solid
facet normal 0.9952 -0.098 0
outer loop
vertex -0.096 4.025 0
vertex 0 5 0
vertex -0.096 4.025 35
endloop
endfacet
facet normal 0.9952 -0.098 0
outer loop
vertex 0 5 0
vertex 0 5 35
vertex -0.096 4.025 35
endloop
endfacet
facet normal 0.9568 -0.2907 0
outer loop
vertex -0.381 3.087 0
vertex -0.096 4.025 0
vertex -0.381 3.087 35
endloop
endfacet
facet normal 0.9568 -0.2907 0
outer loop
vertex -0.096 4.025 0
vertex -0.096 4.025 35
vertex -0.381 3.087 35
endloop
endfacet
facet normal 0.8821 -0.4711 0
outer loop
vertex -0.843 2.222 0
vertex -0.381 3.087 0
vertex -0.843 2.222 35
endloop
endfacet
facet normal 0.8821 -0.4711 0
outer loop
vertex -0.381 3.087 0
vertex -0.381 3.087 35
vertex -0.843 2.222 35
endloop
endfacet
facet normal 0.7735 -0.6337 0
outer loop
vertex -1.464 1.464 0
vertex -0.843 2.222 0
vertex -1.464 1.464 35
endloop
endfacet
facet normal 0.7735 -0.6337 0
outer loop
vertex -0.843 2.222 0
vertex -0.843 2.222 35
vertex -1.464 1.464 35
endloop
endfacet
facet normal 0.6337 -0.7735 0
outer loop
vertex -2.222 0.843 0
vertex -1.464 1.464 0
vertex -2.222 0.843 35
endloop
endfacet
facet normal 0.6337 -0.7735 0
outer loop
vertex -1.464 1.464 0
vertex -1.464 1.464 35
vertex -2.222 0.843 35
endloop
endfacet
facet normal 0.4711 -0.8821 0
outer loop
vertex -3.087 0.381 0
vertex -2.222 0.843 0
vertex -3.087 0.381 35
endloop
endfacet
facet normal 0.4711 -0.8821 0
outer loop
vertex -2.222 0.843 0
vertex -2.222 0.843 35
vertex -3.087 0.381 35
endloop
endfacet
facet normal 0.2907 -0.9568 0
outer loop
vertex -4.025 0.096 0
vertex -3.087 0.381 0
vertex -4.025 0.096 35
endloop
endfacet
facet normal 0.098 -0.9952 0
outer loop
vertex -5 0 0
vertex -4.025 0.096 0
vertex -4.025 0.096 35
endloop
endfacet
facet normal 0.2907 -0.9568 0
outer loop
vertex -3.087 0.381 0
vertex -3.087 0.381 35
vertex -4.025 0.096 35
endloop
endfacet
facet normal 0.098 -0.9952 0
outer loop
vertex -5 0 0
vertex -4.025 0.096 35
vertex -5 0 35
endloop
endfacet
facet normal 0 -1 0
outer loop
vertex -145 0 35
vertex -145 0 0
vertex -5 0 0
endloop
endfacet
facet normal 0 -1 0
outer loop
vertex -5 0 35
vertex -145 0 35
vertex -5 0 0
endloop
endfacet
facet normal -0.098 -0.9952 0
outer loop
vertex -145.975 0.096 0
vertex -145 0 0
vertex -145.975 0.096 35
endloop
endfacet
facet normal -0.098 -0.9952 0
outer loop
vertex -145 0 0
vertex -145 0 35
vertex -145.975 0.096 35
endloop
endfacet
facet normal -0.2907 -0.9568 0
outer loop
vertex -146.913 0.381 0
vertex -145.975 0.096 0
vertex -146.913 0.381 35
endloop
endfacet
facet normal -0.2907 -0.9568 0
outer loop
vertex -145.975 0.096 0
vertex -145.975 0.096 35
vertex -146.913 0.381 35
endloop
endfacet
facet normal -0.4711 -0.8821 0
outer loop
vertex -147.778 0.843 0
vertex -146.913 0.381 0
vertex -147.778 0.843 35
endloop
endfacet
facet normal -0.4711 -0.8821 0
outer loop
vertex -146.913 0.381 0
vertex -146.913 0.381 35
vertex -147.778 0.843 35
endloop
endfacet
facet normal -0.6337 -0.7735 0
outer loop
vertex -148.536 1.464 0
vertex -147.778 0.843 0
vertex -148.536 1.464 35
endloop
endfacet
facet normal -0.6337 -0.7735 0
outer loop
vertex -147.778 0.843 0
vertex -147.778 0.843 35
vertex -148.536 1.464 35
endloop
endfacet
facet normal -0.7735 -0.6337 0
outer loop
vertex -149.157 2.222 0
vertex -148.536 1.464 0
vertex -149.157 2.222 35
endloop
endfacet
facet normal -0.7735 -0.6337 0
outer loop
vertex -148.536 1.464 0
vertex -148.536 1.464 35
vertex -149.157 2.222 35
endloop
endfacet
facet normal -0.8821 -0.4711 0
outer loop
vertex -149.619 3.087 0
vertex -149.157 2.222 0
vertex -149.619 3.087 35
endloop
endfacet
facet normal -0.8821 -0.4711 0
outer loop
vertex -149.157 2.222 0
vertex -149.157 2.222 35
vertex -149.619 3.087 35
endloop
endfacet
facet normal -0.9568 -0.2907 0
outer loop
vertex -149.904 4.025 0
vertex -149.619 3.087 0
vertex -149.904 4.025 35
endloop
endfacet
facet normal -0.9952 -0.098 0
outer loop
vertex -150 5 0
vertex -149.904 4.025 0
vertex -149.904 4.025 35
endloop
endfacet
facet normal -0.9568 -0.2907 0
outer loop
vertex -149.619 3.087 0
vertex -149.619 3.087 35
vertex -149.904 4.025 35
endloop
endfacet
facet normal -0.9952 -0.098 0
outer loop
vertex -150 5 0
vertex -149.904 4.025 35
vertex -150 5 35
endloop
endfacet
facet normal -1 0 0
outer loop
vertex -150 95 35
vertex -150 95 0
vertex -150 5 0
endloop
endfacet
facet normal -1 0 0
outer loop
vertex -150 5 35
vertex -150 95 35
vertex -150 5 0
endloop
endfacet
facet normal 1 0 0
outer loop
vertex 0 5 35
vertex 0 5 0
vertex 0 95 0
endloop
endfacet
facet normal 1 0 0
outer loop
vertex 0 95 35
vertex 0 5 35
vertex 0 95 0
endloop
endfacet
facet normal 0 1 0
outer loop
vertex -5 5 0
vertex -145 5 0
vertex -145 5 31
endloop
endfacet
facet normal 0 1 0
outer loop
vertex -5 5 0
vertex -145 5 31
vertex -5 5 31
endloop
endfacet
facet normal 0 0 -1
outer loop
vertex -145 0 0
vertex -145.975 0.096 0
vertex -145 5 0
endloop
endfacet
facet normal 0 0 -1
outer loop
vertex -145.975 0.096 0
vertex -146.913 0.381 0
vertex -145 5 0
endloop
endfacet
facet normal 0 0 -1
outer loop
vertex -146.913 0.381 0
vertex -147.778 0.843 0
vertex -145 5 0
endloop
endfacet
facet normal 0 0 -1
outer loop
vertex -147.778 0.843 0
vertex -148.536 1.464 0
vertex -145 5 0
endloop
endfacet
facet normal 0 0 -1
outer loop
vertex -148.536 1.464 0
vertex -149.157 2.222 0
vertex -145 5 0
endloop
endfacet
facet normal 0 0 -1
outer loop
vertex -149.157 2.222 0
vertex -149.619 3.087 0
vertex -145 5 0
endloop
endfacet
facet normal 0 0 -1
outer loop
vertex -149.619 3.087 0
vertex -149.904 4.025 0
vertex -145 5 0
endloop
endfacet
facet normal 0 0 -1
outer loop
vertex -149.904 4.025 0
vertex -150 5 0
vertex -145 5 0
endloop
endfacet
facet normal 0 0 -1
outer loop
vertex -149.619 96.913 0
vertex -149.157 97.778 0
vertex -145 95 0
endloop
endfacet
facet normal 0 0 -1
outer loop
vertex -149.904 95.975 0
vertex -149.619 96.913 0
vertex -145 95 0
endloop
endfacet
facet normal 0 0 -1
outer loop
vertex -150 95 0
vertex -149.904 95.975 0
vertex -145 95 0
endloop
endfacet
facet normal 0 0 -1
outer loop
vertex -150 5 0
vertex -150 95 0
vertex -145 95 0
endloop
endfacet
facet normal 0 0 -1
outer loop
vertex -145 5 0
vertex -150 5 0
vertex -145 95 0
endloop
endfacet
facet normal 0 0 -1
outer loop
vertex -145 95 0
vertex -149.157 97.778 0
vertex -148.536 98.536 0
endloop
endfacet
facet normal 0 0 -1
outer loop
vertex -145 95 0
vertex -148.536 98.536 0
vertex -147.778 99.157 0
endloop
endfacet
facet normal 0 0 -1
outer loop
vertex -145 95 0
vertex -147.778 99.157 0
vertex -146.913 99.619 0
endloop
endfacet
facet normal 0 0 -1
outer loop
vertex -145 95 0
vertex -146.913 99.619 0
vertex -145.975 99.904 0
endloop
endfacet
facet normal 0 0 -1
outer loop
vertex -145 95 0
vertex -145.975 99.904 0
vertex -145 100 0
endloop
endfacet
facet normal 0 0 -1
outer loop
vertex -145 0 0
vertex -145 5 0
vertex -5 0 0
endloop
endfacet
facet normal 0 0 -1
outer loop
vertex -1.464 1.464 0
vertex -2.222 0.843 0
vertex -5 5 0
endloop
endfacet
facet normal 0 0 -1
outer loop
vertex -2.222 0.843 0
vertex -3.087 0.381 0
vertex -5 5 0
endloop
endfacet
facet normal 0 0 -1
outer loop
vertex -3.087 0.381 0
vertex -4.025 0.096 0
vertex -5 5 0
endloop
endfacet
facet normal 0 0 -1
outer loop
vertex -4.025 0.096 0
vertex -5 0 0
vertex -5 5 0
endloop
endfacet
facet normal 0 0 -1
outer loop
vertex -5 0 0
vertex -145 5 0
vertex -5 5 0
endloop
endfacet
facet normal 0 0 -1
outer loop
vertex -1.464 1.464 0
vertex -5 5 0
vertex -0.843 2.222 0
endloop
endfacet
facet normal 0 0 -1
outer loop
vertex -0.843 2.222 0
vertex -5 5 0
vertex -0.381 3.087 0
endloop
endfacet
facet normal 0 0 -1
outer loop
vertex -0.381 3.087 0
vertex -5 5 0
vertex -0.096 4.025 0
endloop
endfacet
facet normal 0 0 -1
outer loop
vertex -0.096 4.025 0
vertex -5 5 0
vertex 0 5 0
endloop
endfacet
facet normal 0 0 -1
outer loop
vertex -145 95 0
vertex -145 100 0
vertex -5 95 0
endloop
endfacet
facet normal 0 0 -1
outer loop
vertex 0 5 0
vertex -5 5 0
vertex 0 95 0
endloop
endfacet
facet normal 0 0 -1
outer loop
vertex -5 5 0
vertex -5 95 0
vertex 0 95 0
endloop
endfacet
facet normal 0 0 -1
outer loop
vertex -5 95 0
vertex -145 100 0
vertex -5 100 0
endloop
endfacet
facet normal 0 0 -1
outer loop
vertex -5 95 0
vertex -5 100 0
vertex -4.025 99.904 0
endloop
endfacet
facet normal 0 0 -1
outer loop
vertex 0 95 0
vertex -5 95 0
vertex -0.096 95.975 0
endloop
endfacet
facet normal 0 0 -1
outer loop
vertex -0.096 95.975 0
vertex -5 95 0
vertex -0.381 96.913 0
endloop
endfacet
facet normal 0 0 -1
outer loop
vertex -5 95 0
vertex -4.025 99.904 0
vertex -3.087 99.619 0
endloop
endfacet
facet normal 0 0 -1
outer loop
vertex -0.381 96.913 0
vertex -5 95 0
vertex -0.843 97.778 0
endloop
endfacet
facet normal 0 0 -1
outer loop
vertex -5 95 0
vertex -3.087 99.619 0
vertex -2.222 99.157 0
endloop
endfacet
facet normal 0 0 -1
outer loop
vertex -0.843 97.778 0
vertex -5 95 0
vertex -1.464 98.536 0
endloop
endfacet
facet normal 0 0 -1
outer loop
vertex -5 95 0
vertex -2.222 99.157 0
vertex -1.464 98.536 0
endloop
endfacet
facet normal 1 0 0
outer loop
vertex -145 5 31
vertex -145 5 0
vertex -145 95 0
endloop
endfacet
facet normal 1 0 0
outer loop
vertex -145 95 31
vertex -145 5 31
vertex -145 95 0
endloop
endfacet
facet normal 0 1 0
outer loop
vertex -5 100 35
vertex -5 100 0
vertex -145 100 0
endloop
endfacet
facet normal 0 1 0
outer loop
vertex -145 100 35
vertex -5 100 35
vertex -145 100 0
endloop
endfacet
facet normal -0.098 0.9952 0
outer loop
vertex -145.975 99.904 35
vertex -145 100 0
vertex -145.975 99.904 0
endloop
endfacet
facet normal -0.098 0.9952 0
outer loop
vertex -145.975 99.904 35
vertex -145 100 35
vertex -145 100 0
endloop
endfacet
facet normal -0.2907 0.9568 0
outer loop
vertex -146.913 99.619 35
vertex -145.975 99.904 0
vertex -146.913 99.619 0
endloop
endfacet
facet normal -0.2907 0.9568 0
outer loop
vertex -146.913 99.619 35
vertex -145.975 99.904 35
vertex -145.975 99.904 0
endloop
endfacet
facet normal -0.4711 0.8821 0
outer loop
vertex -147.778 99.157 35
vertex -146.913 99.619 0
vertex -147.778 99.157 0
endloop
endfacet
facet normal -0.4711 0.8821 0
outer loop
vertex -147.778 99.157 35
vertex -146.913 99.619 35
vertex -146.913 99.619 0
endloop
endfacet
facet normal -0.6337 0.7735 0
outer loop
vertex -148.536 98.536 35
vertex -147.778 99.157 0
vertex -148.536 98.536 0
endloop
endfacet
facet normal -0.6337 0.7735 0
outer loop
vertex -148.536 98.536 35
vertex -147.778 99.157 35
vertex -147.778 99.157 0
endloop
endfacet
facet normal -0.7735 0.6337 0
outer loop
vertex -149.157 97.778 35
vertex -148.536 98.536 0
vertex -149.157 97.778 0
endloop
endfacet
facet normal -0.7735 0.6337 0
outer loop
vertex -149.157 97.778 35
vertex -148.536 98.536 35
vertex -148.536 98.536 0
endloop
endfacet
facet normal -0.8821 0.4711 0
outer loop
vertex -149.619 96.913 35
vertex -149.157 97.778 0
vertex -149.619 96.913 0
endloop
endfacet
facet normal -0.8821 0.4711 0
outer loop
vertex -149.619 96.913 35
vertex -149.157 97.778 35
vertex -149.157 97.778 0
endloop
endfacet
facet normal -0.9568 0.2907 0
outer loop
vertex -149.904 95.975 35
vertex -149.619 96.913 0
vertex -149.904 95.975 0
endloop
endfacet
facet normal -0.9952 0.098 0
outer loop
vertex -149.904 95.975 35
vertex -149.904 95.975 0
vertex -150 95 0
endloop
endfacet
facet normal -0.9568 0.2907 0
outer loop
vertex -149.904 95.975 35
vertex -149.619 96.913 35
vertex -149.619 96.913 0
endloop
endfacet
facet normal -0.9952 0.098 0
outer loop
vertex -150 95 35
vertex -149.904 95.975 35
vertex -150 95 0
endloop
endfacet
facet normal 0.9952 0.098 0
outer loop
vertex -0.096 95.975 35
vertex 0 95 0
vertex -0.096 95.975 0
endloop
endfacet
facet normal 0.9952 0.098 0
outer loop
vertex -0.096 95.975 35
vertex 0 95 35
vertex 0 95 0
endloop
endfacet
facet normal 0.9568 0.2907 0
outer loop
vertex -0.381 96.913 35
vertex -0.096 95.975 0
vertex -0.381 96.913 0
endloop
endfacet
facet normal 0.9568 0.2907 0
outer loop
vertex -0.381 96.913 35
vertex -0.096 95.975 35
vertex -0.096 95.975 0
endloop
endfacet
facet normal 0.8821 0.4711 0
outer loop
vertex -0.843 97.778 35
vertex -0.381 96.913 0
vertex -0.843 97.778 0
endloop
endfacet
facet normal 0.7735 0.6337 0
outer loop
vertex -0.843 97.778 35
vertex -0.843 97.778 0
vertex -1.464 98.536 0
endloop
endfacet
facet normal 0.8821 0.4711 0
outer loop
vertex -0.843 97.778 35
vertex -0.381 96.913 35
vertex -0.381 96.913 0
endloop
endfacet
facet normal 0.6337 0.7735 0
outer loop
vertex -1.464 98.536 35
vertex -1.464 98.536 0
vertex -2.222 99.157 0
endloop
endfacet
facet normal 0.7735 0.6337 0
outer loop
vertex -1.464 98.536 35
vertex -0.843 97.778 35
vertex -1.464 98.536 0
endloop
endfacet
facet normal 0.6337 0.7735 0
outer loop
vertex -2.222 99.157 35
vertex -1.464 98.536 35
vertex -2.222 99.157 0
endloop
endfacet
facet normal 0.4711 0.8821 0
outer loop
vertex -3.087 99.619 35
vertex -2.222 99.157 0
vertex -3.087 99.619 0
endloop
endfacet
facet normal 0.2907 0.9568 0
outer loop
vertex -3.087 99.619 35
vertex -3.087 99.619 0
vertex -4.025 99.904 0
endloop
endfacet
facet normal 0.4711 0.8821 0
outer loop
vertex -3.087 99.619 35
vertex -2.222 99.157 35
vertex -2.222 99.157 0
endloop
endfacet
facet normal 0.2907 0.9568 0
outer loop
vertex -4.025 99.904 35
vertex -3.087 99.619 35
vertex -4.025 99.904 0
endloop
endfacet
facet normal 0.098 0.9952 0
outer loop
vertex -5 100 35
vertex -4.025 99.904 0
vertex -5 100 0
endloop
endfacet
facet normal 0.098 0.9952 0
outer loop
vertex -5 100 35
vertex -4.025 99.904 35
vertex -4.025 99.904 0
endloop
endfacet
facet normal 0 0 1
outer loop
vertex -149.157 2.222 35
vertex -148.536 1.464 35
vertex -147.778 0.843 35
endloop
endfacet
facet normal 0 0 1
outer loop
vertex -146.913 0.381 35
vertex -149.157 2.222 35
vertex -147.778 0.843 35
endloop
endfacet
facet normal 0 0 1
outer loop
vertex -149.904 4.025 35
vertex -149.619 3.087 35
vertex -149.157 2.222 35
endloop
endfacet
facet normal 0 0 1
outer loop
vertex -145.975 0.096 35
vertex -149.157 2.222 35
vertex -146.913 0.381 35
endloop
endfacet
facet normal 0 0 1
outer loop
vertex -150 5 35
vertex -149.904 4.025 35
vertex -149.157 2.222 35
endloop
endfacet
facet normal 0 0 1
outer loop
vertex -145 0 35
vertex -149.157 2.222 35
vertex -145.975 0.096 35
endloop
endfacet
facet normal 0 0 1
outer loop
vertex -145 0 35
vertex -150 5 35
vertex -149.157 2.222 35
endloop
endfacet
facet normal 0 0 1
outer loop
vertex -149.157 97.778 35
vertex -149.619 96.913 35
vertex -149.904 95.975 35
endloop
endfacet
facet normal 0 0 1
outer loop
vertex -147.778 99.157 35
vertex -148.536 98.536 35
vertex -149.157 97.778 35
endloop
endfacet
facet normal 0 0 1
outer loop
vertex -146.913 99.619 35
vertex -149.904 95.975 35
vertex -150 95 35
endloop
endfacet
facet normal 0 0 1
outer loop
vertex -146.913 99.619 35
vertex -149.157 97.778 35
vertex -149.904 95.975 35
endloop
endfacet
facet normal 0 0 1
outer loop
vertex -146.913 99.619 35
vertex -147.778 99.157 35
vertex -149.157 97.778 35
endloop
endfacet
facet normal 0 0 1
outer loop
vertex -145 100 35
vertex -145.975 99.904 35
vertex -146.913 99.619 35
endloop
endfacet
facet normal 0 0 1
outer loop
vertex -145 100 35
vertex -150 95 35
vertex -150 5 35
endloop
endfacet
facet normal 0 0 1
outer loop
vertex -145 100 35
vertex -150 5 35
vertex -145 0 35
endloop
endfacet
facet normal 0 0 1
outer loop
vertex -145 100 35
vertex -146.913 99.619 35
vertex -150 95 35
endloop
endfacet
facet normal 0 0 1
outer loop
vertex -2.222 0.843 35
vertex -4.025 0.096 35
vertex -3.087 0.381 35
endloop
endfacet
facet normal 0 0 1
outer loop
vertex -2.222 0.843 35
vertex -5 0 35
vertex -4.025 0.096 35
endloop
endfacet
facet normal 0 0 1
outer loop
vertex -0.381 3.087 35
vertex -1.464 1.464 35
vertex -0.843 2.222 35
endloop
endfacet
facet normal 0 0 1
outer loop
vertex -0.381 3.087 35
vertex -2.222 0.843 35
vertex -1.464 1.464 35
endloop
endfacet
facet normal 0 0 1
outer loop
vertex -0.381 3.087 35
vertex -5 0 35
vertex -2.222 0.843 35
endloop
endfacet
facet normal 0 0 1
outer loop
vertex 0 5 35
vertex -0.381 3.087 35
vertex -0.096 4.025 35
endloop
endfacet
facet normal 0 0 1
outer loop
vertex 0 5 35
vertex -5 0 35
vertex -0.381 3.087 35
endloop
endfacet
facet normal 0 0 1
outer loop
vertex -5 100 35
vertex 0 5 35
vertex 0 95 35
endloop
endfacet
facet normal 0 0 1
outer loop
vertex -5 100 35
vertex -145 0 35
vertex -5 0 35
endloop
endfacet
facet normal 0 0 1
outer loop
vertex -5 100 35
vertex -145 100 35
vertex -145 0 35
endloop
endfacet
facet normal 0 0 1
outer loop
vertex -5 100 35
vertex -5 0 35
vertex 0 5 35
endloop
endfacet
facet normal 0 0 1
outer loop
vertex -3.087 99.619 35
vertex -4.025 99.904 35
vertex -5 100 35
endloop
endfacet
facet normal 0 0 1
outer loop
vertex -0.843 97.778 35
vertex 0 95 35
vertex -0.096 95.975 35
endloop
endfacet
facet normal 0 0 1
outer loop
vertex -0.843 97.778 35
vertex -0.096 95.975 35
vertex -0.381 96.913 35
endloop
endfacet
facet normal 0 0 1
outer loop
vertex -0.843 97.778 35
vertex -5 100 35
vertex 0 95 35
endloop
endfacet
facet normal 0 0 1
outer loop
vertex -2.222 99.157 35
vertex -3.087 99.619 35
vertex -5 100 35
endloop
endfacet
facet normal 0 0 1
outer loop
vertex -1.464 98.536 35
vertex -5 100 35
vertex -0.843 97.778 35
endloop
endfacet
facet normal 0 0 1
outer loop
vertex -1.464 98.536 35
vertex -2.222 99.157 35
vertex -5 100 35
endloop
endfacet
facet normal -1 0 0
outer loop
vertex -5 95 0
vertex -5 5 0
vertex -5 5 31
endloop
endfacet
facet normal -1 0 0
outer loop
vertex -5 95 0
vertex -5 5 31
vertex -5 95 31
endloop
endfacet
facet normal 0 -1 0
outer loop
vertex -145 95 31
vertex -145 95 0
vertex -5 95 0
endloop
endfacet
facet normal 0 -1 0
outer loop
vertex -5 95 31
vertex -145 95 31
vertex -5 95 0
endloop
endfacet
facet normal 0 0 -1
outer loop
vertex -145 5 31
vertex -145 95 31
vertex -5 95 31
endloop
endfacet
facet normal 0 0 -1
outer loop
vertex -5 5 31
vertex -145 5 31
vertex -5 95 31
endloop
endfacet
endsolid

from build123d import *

# Parameters (mm, degrees)
F0_W     = 140
F0_H     = 5
F0_H_2   = 90
F1_DEPTH = 35
F2_DEPTH = 31
F3_R     = 5


with BuildPart() as f1:
    # F0 (on Top) → F1 (new body)
    with BuildSketch(Plane.XY):
        Polygon((-145, 0), (0, 0), (0, 5), (-5, 5), (-145, 5), align=None)
        Polygon((-150, 0), (-145, 0), (-145, 5), (-145, 95), (-145, 100), (-150, 100), align=None)
        Polygon((-5, 5), (0, 5), (0, 100), (-5, 100), (-5, 95), align=None)
        with Locations((-75, 97.5)):
            Rectangle(F0_W, F0_H)
        with Locations((-75, 50)):
            Rectangle(F0_W, F0_H_2)
    extrude(amount=F1_DEPTH)

    # F0 (on Top) → F2 (cut)
    with BuildSketch(Plane.XY):
        with Locations((-75, 50)):
            Rectangle(F0_W, F0_H_2)
    extrude(amount=F2_DEPTH, mode=Mode.SUBTRACT)

    # F3
    f3_edges = [f1.edges().sort_by_distance(p)[0] for p in [
        (0, 0, 17.5),
        (0, 100, 17.5),
        (-150, 100, 17.5),
        (-150, 0, 17.5),
    ]]
    fillet(f3_edges, radius=F3_R)


solid = f1.part
